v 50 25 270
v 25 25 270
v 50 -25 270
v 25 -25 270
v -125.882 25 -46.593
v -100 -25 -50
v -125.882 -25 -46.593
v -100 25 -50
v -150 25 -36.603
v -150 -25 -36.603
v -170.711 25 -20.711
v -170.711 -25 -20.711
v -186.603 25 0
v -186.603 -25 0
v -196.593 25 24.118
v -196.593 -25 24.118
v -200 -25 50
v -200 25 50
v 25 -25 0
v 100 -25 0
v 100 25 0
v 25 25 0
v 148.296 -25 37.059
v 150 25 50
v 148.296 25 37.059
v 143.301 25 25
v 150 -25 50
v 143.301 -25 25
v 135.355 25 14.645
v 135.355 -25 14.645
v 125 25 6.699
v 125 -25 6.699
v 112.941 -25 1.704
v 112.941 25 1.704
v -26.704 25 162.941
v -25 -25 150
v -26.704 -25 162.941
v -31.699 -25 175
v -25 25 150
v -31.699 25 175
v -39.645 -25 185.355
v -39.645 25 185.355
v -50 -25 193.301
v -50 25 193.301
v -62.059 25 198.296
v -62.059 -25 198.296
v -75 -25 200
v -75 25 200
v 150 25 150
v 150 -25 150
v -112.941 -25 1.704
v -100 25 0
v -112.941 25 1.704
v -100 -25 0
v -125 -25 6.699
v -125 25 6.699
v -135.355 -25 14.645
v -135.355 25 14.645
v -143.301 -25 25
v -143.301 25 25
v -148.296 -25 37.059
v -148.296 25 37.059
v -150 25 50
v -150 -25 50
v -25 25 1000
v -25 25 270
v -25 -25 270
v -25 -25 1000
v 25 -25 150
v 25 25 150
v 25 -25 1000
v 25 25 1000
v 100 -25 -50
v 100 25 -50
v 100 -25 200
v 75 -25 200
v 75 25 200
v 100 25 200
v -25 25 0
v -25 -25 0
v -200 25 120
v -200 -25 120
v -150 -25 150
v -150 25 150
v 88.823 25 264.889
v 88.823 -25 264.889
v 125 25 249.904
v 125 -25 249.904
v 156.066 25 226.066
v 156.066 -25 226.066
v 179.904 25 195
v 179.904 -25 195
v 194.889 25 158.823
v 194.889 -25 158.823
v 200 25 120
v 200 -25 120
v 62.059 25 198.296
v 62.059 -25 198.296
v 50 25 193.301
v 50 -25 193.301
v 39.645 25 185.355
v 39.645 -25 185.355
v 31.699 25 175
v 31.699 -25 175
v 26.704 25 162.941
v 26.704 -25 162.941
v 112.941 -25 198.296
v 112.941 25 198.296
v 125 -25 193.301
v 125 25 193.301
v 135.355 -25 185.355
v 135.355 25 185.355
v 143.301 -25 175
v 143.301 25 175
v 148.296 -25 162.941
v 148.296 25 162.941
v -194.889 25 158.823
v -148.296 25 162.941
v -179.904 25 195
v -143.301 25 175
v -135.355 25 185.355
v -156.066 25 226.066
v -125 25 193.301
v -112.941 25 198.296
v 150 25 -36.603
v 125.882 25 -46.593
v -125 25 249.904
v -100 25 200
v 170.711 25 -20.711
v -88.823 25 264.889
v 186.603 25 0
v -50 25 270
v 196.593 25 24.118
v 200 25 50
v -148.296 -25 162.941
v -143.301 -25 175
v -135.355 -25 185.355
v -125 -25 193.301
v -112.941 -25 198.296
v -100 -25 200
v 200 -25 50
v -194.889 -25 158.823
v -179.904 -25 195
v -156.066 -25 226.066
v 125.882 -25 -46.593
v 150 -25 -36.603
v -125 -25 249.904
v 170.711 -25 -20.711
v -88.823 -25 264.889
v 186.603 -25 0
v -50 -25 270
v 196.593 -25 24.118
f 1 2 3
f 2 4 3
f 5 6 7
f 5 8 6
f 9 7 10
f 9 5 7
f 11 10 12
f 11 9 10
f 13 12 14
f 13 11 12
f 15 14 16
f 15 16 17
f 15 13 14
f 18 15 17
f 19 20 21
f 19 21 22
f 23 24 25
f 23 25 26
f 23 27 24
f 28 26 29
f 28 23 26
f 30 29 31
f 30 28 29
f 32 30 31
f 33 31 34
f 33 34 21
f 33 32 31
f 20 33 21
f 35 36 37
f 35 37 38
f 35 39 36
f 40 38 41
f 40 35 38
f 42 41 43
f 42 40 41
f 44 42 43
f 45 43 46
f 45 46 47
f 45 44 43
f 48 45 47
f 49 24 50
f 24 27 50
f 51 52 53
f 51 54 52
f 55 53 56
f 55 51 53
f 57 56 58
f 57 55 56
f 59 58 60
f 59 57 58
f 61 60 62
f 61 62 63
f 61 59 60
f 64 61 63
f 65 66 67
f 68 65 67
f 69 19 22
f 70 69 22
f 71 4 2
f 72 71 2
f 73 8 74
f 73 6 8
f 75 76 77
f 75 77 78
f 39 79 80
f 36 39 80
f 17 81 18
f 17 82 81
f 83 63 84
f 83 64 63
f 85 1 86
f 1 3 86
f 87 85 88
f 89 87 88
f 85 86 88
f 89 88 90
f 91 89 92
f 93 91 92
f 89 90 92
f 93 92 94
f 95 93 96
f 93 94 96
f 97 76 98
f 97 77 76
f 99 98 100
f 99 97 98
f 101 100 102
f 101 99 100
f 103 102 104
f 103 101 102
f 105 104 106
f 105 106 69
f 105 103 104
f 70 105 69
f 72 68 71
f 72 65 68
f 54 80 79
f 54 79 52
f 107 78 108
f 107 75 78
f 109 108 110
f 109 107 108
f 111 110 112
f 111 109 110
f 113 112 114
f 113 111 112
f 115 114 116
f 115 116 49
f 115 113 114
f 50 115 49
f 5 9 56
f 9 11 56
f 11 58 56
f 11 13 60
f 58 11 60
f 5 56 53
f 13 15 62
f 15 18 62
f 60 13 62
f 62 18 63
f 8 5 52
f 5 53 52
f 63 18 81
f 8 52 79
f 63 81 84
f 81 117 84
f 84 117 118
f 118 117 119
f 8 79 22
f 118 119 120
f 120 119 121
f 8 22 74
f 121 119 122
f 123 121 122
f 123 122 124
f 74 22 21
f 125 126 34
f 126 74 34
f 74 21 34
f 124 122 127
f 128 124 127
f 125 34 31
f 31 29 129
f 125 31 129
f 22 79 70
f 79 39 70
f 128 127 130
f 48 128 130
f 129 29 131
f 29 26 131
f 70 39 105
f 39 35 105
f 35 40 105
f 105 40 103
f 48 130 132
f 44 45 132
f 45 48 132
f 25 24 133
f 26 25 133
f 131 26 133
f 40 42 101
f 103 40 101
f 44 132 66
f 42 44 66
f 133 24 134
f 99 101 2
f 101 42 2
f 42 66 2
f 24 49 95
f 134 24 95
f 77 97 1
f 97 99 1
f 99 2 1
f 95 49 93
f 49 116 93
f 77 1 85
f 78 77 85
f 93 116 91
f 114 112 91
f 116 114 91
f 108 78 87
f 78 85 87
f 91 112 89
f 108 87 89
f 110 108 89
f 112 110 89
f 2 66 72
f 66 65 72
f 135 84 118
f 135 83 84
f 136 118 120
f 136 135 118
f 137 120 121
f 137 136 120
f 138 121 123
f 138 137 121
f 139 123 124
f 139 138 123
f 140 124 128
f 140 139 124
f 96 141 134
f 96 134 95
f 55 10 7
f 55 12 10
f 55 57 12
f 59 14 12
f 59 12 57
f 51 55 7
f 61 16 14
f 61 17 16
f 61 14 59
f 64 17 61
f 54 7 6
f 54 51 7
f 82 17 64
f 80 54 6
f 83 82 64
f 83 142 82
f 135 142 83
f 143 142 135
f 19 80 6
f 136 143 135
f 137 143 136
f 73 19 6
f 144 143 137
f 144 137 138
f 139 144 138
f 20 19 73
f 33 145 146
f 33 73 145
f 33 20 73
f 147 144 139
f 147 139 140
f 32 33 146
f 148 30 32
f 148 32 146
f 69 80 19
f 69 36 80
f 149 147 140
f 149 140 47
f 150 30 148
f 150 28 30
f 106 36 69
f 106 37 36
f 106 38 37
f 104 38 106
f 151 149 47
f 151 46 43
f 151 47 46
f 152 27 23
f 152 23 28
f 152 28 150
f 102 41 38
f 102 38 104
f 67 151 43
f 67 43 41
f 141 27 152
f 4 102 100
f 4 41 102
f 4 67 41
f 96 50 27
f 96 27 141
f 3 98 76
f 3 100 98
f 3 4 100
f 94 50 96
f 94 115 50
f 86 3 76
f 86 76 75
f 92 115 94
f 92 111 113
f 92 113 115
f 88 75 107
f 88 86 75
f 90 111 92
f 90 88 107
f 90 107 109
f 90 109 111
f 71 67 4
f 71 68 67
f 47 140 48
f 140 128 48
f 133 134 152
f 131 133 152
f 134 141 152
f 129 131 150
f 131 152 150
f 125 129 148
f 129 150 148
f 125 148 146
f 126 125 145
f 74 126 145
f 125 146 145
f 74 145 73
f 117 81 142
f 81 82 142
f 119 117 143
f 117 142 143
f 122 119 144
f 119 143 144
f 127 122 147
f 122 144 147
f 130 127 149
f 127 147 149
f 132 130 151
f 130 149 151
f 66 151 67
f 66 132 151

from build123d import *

# Parameters (mm, degrees)
F1_DEPTH      = 1000
F2_W          = 50
F2_H          = 200
F3_DEPTH      = 25
F3_DEPTH_BACK = 25
F4_W          = 175
F4_H          = 70
F5_DEPTH      = 25
F5_DEPTH_BACK = 25
F6_R          = 150
F7_R          = 100
F8_R          = 50


with BuildPart() as f1:
    # F0 (on Top) → F1 (new body)
    with BuildSketch(Plane.XY):
        Polygon((-25, 0), (-25, -25), (25, -25), (25, 25), (-25, 25), align=None)
    extrude(amount=F1_DEPTH)

    # F2 (on Front) → F3 (join, two sides)
    with BuildSketch(Plane.XZ) as f3_sk:
        Polygon((0, -50), (0, 0), (-150, 0), (-200, 0), (-200, -50), align=None)
        Polygon((150, 0), (0, 0), (0, -50), (200, -50), (200, 0), align=None)
        with Locations((-175, 100)):
            Rectangle(F2_W, F2_H)
        with Locations((175, 100)):
            Rectangle(F2_W, F2_H)
    extrude(amount=F3_DEPTH)
    extrude(f3_sk.sketch, amount=-F3_DEPTH_BACK)

    # F4 (on Front) → F5 (join, two sides)
    with BuildSketch(Plane.XZ) as f5_sk:
        with Locations((112.5, 235)):
            Rectangle(F4_W, F4_H)
        with Locations((-112.5, 235)):
            Rectangle(F4_W, F4_H)
    extrude(amount=F5_DEPTH)
    extrude(f5_sk.sketch, amount=-F5_DEPTH_BACK)

    # F6
    f6_edges = [f1.edges().sort_by_distance(p)[0] for p in [
        (200, 0, 270),
        (-200, 0, 270),
    ]]
    fillet(f6_edges, radius=F6_R)

    # F7
    f7_edges = [f1.edges().sort_by_distance(p)[0] for p in [
        (-200, 0, -50),
        (200, 0, -50),
    ]]
    fillet(f7_edges, radius=F7_R)

    # F8
    f8_edges = [f1.edges().sort_by_distance(p)[0] for p in [
        (-25, 0, 200),
        (25, 0, 200),
        (-150, 0, 200),
        (150, 0, 200),
        (-150, 0, 0),
        (150, 0, 0),
    ]]
    fillet(f8_edges, radius=F8_R)


solid = f1.part
